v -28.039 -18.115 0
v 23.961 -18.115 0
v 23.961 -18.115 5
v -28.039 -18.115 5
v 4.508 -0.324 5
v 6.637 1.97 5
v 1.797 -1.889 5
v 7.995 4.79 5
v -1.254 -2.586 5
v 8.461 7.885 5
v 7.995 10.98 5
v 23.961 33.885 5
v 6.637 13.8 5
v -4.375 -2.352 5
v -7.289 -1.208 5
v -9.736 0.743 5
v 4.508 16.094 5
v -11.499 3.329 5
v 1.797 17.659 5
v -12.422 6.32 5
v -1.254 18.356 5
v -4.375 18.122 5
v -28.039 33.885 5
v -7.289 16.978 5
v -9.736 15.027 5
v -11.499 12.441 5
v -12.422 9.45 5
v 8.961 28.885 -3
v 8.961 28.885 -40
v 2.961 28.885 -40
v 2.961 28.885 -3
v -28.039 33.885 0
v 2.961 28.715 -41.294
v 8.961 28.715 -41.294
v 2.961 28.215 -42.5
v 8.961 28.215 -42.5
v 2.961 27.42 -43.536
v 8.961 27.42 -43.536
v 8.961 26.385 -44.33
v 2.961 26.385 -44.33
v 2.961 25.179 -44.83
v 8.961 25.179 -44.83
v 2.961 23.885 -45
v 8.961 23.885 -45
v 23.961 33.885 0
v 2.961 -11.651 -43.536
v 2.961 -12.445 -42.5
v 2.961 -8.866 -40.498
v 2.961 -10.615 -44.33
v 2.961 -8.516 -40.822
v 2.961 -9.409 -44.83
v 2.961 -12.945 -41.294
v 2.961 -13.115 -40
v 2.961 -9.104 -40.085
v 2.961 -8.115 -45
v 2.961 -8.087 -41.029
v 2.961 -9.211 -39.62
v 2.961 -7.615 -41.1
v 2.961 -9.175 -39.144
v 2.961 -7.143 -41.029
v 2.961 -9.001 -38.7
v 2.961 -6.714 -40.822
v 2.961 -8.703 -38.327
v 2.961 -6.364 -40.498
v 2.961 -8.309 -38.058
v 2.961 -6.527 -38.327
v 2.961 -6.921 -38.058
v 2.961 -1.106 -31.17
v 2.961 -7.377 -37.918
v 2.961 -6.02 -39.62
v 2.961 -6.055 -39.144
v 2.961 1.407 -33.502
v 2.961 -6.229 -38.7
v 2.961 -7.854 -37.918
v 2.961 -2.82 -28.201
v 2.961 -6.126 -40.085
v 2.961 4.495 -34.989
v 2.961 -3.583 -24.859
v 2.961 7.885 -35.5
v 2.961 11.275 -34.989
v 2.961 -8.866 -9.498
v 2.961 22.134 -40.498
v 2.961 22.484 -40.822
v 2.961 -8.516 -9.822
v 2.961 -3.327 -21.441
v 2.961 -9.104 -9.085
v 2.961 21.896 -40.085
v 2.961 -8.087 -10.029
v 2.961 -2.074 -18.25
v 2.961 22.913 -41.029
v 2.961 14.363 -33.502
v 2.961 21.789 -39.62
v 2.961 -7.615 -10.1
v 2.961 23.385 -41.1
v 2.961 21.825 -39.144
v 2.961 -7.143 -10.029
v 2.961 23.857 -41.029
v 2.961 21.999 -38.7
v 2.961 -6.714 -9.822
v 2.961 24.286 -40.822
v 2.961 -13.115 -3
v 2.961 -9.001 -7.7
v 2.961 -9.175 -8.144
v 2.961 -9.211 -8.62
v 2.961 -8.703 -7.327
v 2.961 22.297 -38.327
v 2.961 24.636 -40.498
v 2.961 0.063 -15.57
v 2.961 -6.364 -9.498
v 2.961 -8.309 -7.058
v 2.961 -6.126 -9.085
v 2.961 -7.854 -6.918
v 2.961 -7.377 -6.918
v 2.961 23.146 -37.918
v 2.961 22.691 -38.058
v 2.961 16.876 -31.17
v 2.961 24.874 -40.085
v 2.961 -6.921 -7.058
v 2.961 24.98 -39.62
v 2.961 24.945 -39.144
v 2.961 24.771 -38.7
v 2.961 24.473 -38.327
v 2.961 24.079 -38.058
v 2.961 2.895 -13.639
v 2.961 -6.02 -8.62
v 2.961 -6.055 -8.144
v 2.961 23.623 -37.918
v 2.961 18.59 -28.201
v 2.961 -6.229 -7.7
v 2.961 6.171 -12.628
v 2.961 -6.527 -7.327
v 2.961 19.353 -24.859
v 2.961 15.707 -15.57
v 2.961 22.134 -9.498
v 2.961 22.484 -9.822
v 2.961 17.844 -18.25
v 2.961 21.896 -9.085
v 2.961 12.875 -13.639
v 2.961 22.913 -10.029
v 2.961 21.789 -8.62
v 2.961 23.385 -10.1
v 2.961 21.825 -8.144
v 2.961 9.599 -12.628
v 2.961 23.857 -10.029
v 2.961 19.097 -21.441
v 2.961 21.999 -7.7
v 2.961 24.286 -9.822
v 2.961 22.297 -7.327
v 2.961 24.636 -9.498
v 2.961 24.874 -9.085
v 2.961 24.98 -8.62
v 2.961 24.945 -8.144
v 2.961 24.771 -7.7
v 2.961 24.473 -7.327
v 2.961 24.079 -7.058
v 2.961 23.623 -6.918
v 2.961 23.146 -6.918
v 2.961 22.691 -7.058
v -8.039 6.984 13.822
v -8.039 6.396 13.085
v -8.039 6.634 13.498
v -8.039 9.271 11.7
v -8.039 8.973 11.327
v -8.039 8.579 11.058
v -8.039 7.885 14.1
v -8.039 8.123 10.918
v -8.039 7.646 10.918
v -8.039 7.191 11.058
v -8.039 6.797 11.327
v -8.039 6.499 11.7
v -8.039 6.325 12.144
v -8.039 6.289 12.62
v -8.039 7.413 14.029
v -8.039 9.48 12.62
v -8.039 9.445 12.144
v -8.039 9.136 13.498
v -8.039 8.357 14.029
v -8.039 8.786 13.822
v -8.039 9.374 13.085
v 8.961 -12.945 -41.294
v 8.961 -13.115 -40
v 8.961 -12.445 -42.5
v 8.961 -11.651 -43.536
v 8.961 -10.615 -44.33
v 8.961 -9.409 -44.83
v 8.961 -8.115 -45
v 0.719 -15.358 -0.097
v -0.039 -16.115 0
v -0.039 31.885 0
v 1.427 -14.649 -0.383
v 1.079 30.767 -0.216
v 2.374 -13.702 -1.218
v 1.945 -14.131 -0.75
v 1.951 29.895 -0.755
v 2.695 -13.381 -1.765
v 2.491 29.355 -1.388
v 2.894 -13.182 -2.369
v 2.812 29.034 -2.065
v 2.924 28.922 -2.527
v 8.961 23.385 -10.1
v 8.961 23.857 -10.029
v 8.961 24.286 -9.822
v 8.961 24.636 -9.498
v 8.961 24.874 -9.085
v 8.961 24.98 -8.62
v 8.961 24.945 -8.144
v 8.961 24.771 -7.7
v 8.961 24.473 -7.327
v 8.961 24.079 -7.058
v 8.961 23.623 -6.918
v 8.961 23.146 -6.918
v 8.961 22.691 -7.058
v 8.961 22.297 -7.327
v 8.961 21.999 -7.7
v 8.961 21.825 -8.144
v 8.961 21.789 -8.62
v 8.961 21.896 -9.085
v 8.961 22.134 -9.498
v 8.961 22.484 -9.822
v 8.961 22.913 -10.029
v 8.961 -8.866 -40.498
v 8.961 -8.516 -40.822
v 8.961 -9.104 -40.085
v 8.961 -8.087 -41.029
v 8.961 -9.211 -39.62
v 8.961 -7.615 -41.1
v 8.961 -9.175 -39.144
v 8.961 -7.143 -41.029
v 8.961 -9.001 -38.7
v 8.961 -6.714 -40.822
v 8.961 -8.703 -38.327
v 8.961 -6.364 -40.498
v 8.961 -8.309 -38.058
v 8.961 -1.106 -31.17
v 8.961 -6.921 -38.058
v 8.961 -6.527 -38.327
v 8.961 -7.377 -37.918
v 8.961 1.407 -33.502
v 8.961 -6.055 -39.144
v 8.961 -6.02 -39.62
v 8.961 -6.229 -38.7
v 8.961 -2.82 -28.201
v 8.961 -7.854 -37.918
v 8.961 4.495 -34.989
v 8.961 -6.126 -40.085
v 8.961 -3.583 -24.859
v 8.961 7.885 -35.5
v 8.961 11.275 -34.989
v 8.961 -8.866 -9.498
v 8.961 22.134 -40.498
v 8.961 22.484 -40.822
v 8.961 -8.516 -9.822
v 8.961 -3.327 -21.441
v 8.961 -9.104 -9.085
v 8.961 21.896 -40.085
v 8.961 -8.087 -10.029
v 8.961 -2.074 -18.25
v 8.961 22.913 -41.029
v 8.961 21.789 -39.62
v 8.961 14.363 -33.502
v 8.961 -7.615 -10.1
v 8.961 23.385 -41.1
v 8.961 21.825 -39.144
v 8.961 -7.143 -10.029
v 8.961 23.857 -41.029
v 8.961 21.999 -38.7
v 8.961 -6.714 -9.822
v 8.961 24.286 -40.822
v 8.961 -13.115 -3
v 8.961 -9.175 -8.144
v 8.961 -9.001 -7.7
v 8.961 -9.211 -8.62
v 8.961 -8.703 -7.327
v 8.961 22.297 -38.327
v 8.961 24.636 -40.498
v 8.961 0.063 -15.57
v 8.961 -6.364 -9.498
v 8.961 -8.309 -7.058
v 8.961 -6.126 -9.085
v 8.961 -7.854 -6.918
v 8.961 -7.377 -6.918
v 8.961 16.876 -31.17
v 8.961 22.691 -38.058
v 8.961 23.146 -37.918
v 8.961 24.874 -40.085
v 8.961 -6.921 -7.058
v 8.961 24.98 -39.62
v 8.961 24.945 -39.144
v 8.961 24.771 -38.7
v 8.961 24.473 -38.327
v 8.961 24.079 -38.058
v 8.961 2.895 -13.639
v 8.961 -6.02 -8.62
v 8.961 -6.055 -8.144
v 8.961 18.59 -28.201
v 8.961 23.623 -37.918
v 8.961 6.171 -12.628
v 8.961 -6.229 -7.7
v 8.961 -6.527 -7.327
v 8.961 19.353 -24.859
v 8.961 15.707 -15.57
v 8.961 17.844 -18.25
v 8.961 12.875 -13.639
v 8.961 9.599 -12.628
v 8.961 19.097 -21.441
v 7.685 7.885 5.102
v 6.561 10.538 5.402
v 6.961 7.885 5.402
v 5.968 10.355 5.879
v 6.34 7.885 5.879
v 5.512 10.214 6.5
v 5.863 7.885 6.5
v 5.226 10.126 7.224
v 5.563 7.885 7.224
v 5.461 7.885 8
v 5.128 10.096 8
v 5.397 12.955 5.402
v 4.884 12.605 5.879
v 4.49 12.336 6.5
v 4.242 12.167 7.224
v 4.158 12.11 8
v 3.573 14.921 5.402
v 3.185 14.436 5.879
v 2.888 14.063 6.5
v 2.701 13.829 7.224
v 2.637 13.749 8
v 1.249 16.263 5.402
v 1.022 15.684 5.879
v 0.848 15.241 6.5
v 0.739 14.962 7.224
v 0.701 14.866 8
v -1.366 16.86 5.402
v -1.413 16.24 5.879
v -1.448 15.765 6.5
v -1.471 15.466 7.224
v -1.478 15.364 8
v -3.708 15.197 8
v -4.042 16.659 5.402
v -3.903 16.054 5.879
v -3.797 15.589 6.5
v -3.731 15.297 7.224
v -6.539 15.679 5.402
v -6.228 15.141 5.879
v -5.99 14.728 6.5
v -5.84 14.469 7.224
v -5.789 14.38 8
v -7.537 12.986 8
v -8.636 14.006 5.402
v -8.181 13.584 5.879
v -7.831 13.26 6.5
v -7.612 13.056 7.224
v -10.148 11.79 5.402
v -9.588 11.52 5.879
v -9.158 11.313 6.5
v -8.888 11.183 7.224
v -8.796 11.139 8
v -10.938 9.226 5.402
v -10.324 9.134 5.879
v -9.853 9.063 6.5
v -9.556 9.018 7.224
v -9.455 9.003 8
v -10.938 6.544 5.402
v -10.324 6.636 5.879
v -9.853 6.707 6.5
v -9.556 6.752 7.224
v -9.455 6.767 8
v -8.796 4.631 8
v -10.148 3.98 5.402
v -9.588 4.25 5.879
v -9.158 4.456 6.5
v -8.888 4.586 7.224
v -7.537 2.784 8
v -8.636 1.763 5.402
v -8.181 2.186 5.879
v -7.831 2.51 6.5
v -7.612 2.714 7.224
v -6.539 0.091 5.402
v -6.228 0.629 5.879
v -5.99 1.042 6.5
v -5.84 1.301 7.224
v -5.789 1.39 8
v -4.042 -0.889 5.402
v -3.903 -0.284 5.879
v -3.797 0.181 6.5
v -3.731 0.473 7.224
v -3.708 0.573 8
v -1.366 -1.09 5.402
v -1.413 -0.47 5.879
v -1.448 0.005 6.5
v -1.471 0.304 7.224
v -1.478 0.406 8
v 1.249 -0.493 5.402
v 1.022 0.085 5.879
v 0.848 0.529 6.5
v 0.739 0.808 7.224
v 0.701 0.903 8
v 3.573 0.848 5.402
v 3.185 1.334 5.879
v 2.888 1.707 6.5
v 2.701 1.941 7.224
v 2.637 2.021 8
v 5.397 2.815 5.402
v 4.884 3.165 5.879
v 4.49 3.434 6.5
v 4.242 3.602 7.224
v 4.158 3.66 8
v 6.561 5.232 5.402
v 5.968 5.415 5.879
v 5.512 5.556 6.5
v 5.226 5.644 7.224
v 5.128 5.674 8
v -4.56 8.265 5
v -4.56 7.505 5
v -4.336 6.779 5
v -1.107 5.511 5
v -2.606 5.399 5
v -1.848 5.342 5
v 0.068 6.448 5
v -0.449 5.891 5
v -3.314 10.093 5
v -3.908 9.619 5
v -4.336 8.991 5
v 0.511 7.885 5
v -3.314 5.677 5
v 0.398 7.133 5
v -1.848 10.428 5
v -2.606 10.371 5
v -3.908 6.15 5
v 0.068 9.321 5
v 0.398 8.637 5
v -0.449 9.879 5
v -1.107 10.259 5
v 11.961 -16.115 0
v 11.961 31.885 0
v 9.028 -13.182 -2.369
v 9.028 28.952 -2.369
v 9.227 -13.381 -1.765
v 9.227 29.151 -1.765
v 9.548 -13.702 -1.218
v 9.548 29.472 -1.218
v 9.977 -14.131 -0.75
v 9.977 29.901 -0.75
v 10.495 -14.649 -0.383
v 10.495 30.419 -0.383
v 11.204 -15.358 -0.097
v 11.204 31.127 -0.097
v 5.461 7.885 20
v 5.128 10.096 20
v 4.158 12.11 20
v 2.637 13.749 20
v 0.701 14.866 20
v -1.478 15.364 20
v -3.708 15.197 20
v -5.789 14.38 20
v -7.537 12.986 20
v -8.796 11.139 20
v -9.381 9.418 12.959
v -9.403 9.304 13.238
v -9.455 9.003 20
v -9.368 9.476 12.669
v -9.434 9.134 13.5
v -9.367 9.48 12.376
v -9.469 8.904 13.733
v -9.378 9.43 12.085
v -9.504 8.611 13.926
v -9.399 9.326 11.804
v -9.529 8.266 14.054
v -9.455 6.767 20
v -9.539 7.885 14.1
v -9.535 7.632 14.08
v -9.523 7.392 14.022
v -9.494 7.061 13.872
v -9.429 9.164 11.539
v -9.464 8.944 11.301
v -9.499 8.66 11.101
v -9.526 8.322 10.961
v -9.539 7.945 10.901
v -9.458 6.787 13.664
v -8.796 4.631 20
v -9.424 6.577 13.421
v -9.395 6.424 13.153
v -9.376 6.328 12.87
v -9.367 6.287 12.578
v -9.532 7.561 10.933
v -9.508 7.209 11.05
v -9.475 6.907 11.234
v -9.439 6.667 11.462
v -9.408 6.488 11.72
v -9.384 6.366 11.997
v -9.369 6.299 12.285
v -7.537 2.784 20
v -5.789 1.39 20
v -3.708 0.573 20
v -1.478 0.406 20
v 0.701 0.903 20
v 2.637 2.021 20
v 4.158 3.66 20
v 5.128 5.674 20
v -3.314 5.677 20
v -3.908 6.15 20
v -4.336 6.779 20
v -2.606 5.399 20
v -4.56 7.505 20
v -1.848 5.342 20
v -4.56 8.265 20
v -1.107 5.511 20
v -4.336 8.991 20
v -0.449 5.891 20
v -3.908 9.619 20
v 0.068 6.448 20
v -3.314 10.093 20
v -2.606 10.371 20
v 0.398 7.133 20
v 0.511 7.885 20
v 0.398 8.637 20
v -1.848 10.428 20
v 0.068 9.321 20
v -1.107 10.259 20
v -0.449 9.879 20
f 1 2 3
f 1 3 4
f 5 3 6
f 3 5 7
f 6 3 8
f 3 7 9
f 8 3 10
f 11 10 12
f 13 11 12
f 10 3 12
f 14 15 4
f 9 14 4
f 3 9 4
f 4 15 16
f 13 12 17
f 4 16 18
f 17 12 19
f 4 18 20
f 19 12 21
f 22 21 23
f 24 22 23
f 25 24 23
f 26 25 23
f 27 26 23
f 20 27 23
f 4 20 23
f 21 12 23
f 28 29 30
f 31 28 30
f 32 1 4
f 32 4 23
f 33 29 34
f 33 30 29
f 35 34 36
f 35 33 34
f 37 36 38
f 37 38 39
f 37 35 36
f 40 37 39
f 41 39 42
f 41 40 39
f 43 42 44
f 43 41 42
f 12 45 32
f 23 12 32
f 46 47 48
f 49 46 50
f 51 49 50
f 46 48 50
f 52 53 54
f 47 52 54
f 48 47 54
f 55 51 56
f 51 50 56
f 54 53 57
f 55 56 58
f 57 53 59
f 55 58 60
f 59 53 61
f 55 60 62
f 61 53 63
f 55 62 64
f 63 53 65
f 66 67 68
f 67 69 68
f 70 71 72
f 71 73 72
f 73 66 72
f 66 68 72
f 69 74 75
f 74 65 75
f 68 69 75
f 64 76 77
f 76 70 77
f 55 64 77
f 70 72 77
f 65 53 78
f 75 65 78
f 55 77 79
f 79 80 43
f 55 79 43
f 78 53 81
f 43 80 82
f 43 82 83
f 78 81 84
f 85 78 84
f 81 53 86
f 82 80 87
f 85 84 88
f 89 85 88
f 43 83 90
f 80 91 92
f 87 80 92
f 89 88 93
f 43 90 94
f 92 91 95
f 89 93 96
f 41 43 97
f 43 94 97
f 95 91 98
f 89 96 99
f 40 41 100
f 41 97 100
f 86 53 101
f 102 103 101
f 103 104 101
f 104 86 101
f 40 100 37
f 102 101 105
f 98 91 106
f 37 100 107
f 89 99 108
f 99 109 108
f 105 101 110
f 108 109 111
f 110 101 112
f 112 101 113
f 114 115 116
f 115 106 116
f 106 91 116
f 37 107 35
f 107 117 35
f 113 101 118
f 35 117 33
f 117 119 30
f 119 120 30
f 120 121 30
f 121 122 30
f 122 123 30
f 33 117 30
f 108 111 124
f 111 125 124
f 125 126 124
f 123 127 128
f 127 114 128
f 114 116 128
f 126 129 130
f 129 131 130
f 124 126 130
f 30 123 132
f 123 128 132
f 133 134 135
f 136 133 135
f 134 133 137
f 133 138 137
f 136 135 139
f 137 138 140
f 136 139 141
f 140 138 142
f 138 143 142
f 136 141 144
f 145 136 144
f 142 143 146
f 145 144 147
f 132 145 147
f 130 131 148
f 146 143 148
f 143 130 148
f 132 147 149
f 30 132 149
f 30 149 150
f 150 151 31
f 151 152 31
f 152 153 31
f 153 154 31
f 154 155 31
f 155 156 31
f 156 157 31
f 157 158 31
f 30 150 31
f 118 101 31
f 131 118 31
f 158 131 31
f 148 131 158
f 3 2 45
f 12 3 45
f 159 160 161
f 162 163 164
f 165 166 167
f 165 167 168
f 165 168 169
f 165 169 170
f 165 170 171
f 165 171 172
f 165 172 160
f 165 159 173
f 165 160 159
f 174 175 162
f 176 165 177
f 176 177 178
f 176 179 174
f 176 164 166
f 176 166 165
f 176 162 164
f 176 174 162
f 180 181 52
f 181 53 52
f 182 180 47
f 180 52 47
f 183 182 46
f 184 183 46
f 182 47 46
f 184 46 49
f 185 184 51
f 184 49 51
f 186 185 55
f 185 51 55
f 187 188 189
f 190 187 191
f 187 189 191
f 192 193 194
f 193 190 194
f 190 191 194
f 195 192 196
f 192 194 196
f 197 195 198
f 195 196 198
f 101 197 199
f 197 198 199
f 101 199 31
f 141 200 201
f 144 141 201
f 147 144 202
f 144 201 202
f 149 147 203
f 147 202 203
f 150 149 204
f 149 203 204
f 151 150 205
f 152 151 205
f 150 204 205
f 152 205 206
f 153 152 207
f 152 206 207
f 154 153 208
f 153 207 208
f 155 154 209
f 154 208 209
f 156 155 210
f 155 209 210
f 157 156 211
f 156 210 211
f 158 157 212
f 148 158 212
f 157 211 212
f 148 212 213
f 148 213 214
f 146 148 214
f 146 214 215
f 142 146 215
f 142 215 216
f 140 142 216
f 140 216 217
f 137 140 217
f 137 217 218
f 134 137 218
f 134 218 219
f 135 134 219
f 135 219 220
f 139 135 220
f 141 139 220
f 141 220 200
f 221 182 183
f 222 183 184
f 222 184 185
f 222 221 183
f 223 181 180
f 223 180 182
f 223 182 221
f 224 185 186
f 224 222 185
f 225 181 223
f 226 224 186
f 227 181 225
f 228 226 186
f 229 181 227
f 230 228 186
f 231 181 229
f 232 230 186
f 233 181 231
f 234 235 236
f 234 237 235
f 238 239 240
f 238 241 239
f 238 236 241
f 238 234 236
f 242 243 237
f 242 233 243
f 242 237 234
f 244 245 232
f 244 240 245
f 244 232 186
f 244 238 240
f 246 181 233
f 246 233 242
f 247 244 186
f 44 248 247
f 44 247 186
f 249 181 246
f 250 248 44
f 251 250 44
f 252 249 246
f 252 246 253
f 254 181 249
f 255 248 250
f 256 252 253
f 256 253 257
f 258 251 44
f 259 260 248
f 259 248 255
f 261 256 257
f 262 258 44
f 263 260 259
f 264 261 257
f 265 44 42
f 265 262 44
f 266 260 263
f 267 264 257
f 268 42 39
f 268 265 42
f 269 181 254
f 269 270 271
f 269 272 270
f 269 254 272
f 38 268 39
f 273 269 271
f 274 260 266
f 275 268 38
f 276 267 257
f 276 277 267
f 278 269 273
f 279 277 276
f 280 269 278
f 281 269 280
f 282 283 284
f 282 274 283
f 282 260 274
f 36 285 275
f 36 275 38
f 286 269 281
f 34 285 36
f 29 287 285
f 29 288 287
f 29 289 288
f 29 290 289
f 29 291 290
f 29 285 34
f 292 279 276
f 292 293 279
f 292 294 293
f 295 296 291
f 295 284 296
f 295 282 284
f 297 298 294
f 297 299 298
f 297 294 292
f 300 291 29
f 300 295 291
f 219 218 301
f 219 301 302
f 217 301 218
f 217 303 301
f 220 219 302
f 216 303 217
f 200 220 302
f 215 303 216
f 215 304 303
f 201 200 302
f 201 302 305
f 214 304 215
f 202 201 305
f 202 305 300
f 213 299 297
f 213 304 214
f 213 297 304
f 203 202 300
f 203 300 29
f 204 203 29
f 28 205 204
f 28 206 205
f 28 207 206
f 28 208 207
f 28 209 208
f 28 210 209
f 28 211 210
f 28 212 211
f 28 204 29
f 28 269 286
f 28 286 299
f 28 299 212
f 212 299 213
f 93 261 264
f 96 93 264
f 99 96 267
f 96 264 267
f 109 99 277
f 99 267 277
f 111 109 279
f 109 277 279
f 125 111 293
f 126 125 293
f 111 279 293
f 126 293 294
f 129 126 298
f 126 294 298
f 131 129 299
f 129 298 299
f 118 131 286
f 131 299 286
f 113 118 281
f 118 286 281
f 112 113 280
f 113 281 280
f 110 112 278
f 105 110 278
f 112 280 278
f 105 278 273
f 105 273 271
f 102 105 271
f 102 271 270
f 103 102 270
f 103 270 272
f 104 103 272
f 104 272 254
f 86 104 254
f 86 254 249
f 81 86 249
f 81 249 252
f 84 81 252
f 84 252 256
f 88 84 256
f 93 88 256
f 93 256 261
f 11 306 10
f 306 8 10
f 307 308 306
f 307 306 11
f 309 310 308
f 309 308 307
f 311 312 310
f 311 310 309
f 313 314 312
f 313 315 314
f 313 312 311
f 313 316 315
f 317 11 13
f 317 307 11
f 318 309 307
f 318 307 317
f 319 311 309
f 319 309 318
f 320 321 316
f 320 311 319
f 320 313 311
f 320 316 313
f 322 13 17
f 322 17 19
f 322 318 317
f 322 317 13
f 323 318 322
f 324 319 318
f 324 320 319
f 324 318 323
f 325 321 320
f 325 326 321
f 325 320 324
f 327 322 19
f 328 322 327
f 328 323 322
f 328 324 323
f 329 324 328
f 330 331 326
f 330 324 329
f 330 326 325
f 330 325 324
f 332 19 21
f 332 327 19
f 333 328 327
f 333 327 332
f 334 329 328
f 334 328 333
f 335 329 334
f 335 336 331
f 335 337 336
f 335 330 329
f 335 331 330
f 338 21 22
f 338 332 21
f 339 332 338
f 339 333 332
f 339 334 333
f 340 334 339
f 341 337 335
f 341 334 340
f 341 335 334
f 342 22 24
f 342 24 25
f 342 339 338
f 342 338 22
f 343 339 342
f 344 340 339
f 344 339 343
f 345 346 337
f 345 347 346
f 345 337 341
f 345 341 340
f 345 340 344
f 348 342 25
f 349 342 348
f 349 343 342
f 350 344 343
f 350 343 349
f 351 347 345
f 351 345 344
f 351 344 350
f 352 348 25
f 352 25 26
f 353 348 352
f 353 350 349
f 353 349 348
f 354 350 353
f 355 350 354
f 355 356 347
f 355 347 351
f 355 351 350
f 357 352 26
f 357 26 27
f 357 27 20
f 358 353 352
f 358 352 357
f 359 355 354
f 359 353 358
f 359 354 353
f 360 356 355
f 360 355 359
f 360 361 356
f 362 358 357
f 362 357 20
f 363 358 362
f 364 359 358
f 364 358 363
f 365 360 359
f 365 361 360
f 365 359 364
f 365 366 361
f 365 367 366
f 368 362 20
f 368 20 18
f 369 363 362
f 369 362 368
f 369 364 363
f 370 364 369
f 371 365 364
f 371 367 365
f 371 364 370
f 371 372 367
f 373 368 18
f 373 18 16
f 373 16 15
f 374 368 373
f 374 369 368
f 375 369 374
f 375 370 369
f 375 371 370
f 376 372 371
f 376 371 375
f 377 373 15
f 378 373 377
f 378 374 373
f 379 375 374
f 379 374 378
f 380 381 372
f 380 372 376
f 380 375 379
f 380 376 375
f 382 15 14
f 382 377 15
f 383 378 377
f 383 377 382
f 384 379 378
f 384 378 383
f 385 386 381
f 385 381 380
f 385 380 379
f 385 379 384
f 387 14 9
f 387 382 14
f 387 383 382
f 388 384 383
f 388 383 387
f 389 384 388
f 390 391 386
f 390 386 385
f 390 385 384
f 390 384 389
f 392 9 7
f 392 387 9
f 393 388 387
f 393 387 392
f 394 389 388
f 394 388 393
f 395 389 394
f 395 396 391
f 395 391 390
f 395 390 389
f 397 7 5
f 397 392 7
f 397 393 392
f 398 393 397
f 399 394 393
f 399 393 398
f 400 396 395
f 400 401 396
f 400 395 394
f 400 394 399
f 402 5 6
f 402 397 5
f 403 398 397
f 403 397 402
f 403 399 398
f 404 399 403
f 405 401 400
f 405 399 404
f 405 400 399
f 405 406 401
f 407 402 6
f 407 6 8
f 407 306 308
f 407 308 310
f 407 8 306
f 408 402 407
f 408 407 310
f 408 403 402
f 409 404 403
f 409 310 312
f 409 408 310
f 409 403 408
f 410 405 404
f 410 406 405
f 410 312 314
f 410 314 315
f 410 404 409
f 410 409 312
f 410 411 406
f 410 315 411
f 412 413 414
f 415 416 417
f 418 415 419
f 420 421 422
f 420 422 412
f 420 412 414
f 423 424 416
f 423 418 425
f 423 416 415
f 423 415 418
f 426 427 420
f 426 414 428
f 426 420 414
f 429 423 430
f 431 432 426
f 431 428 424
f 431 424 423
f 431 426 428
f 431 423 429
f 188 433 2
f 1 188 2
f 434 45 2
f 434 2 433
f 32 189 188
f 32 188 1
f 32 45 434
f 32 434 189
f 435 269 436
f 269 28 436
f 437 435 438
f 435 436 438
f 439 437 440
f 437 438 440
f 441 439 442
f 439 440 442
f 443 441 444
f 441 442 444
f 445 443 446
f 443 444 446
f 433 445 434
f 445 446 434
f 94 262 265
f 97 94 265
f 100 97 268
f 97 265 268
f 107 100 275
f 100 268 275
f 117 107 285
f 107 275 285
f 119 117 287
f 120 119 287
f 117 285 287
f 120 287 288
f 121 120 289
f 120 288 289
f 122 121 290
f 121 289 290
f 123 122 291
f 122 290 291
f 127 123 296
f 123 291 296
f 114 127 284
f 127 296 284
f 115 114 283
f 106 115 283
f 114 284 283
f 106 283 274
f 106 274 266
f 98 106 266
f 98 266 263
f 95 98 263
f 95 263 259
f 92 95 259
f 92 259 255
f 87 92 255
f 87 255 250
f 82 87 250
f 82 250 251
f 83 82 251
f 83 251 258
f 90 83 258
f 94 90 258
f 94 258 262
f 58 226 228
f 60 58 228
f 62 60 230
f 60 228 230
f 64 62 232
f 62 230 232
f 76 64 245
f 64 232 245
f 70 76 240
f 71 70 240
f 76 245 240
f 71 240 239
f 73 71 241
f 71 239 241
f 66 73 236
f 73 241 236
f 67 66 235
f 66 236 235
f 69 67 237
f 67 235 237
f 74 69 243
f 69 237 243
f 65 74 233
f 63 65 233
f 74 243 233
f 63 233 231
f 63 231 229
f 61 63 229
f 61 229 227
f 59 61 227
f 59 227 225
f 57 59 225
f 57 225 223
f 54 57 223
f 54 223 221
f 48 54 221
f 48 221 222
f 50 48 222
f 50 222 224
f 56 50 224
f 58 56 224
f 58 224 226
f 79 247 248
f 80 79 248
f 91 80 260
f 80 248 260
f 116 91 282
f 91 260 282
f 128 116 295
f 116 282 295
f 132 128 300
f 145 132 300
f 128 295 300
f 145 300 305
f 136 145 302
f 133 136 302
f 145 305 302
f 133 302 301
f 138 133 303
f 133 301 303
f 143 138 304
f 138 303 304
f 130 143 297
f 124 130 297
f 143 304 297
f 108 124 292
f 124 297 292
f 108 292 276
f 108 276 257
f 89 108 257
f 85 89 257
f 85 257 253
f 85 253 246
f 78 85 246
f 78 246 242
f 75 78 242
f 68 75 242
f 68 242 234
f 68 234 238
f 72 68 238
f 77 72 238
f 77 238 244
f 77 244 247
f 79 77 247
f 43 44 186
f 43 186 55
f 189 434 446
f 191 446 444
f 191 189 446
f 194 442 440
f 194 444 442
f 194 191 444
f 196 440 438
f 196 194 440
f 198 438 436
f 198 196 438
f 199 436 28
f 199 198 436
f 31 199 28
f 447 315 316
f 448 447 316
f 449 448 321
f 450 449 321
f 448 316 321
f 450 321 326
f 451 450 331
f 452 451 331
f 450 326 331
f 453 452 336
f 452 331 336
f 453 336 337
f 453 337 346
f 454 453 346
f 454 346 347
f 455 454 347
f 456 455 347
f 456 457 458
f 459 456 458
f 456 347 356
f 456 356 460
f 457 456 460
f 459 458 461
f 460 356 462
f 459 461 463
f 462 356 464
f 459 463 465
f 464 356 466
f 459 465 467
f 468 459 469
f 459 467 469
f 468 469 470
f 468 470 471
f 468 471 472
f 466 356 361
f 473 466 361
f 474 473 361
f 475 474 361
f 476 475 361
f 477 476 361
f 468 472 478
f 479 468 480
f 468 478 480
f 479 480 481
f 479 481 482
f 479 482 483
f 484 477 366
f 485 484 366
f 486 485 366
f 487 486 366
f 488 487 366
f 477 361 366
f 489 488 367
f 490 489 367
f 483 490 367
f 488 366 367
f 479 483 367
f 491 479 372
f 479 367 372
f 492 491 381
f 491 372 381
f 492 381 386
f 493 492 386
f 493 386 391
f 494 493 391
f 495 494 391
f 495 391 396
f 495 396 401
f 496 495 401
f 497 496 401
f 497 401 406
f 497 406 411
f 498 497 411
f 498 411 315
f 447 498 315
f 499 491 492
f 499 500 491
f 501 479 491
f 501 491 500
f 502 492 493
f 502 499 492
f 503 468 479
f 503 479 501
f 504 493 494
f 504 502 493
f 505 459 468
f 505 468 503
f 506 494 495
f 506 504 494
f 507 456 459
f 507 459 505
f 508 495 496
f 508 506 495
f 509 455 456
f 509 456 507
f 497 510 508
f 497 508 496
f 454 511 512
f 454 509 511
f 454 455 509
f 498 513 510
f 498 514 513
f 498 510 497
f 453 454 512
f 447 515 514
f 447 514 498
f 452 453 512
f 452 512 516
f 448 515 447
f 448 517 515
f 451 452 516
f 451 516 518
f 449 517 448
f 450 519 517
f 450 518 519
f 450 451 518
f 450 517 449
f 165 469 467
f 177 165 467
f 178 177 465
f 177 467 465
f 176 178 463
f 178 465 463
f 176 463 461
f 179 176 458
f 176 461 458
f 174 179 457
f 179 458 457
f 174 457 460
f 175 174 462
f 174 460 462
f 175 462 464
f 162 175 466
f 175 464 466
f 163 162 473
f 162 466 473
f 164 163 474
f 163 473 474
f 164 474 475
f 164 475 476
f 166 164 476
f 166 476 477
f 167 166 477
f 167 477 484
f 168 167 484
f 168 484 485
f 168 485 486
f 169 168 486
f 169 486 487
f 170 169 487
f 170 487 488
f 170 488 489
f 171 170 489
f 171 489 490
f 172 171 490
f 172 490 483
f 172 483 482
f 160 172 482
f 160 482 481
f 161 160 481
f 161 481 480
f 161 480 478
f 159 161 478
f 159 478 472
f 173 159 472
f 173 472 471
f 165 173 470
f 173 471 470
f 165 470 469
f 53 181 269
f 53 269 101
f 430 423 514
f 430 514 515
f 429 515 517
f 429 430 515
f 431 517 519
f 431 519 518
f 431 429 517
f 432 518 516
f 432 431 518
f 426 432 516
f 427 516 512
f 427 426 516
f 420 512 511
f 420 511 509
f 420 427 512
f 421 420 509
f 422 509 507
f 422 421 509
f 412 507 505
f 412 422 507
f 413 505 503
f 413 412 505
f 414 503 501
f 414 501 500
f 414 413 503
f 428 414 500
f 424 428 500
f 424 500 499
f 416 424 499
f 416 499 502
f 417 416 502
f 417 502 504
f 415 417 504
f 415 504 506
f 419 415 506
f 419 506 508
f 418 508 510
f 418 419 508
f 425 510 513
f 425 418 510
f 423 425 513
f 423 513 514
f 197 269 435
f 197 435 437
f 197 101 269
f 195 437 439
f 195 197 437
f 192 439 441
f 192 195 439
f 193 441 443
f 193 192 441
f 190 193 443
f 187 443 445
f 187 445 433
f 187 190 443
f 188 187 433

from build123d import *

# Parameters (mm, degrees)
SKETCH_1_R          = 26
EXTRUDE_1_DEPTH     = 5
SKETCH_2_R          = 7.5
SKETCH_2_R_2        = 2.55
EXTRUDE_2_DEPTH     = 15
SKETCH_4_R          = 1.6
CUT_EXTRUDE_1_DEPTH = 20
SKETCH_6_R          = 40.158600147
EXTRUDE_4_DEPTH     = 5
SKETCH_7_R          = 40.158600147
SKETCH_7_W          = 52
SKETCH_7_H          = 52
CUT_EXTRUDE_2_DEPTH = 5
SKETCH_8_W          = 6
SKETCH_8_H          = 42
EXTRUDE_5_DEPTH     = 45
SKETCH_9_R          = 11.5
SKETCH_9_R_2        = 1.6
CUT_EXTRUDE_3_DEPTH = 10
FILLET_1_R          = 5
FILLET_2_R          = 3


with BuildPart() as part:
    # 草图1 → 凸台-拉伸1 (new body)
    with BuildSketch(Plane.XY):
        with Locations((-2.038900501, 7.884914675)):
            Circle(SKETCH_1_R)
    extrude(amount=EXTRUDE_1_DEPTH)

    # 草图2 → 凸台-拉伸2 (add)
    with BuildSketch(Plane.XY.offset(5)):
        with Locations((-2.038900501, 7.884914675)):
            Circle(SKETCH_2_R)
        with Locations((-2.038900501, 7.884914675)):
            Circle(SKETCH_2_R_2, mode=Mode.SUBTRACT)
    extrude(amount=EXTRUDE_2_DEPTH)

    # 草图4 → 切除-拉伸1 (cut)
    with BuildSketch(Plane.ZY.offset(28.038900501)):
        with Locations((12.5, 7.884914675)):
            Circle(SKETCH_4_R)
    extrude(amount=-CUT_EXTRUDE_1_DEPTH, mode=Mode.SUBTRACT)

    # 草图6 → 凸台-拉伸4 (add)
    with BuildSketch(Plane(origin=(0, 0, 0), x_dir=(-1, 0, 0), z_dir=(0, 0, -1))):
        with Locations((2.038900501, 7.884914675)):
            Circle(SKETCH_6_R)
    extrude(amount=-EXTRUDE_4_DEPTH)

    # 草图7 → 切除-拉伸2 (cut)
    with BuildSketch(Plane(origin=(0, 0, 0), x_dir=(-1, 0, 0), z_dir=(0, 0, -1))):
        with Locations((2.038900501, 7.884914675)):
            Circle(SKETCH_7_R)
        with Locations((2.038900501, 7.884914675)):
            Rectangle(SKETCH_7_W, SKETCH_7_H, mode=Mode.SUBTRACT)
    extrude(amount=-CUT_EXTRUDE_2_DEPTH, mode=Mode.SUBTRACT)

    # 草图8 → 凸台-拉伸5 (add)
    with BuildSketch(Plane(origin=(0, 0, 0), x_dir=(-1, 0, 0), z_dir=(0, 0, -1))):
        with Locations((-5.961099499, 7.884914675)):
            Rectangle(SKETCH_8_W, SKETCH_8_H)
    extrude(amount=EXTRUDE_5_DEPTH)

    # 草图9 → 切除-拉伸3 (cut)
    with BuildSketch(Plane(origin=(8.961099499, 0, 0), x_dir=(0, 0, -1), z_dir=(1, 0, 0))):
        with Locations((24, 7.884914675)):
            Circle(SKETCH_9_R)
        with Locations((39.5, 23.384914675)):
            Circle(SKETCH_9_R_2)
        with Locations((8.5, -7.615085325)):
            Circle(SKETCH_9_R_2)
        with Locations((39.5, -7.615085325)):
            Circle(SKETCH_9_R_2)
        with Locations((8.5, 23.384914675)):
            Circle(SKETCH_9_R_2)
    extrude(amount=-CUT_EXTRUDE_3_DEPTH, mode=Mode.SUBTRACT)

    # 圆角1
    fillet_1_edges = [part.edges().sort_by_distance(p)[0] for p in [
        (5.961099499, -13.115085325, -45),
        (5.961099499, 28.884914675, -45),
    ]]
    fillet(fillet_1_edges, radius=FILLET_1_R)

    # 圆角2
    fillet_2_edges = [part.edges().sort_by_distance(p)[0] for p in [
        (8.961099499, 7.884914675, 0),
        (5.961099499, -13.115085325, 0),
        (2.961099499, 7.884914675, 0),
        (5.961099499, 28.884914675, 0),
        (-9.538900501, 7.884914675, 5),
    ]]
    fillet(fillet_2_edges, radius=FILLET_2_R)


solid = part.part
